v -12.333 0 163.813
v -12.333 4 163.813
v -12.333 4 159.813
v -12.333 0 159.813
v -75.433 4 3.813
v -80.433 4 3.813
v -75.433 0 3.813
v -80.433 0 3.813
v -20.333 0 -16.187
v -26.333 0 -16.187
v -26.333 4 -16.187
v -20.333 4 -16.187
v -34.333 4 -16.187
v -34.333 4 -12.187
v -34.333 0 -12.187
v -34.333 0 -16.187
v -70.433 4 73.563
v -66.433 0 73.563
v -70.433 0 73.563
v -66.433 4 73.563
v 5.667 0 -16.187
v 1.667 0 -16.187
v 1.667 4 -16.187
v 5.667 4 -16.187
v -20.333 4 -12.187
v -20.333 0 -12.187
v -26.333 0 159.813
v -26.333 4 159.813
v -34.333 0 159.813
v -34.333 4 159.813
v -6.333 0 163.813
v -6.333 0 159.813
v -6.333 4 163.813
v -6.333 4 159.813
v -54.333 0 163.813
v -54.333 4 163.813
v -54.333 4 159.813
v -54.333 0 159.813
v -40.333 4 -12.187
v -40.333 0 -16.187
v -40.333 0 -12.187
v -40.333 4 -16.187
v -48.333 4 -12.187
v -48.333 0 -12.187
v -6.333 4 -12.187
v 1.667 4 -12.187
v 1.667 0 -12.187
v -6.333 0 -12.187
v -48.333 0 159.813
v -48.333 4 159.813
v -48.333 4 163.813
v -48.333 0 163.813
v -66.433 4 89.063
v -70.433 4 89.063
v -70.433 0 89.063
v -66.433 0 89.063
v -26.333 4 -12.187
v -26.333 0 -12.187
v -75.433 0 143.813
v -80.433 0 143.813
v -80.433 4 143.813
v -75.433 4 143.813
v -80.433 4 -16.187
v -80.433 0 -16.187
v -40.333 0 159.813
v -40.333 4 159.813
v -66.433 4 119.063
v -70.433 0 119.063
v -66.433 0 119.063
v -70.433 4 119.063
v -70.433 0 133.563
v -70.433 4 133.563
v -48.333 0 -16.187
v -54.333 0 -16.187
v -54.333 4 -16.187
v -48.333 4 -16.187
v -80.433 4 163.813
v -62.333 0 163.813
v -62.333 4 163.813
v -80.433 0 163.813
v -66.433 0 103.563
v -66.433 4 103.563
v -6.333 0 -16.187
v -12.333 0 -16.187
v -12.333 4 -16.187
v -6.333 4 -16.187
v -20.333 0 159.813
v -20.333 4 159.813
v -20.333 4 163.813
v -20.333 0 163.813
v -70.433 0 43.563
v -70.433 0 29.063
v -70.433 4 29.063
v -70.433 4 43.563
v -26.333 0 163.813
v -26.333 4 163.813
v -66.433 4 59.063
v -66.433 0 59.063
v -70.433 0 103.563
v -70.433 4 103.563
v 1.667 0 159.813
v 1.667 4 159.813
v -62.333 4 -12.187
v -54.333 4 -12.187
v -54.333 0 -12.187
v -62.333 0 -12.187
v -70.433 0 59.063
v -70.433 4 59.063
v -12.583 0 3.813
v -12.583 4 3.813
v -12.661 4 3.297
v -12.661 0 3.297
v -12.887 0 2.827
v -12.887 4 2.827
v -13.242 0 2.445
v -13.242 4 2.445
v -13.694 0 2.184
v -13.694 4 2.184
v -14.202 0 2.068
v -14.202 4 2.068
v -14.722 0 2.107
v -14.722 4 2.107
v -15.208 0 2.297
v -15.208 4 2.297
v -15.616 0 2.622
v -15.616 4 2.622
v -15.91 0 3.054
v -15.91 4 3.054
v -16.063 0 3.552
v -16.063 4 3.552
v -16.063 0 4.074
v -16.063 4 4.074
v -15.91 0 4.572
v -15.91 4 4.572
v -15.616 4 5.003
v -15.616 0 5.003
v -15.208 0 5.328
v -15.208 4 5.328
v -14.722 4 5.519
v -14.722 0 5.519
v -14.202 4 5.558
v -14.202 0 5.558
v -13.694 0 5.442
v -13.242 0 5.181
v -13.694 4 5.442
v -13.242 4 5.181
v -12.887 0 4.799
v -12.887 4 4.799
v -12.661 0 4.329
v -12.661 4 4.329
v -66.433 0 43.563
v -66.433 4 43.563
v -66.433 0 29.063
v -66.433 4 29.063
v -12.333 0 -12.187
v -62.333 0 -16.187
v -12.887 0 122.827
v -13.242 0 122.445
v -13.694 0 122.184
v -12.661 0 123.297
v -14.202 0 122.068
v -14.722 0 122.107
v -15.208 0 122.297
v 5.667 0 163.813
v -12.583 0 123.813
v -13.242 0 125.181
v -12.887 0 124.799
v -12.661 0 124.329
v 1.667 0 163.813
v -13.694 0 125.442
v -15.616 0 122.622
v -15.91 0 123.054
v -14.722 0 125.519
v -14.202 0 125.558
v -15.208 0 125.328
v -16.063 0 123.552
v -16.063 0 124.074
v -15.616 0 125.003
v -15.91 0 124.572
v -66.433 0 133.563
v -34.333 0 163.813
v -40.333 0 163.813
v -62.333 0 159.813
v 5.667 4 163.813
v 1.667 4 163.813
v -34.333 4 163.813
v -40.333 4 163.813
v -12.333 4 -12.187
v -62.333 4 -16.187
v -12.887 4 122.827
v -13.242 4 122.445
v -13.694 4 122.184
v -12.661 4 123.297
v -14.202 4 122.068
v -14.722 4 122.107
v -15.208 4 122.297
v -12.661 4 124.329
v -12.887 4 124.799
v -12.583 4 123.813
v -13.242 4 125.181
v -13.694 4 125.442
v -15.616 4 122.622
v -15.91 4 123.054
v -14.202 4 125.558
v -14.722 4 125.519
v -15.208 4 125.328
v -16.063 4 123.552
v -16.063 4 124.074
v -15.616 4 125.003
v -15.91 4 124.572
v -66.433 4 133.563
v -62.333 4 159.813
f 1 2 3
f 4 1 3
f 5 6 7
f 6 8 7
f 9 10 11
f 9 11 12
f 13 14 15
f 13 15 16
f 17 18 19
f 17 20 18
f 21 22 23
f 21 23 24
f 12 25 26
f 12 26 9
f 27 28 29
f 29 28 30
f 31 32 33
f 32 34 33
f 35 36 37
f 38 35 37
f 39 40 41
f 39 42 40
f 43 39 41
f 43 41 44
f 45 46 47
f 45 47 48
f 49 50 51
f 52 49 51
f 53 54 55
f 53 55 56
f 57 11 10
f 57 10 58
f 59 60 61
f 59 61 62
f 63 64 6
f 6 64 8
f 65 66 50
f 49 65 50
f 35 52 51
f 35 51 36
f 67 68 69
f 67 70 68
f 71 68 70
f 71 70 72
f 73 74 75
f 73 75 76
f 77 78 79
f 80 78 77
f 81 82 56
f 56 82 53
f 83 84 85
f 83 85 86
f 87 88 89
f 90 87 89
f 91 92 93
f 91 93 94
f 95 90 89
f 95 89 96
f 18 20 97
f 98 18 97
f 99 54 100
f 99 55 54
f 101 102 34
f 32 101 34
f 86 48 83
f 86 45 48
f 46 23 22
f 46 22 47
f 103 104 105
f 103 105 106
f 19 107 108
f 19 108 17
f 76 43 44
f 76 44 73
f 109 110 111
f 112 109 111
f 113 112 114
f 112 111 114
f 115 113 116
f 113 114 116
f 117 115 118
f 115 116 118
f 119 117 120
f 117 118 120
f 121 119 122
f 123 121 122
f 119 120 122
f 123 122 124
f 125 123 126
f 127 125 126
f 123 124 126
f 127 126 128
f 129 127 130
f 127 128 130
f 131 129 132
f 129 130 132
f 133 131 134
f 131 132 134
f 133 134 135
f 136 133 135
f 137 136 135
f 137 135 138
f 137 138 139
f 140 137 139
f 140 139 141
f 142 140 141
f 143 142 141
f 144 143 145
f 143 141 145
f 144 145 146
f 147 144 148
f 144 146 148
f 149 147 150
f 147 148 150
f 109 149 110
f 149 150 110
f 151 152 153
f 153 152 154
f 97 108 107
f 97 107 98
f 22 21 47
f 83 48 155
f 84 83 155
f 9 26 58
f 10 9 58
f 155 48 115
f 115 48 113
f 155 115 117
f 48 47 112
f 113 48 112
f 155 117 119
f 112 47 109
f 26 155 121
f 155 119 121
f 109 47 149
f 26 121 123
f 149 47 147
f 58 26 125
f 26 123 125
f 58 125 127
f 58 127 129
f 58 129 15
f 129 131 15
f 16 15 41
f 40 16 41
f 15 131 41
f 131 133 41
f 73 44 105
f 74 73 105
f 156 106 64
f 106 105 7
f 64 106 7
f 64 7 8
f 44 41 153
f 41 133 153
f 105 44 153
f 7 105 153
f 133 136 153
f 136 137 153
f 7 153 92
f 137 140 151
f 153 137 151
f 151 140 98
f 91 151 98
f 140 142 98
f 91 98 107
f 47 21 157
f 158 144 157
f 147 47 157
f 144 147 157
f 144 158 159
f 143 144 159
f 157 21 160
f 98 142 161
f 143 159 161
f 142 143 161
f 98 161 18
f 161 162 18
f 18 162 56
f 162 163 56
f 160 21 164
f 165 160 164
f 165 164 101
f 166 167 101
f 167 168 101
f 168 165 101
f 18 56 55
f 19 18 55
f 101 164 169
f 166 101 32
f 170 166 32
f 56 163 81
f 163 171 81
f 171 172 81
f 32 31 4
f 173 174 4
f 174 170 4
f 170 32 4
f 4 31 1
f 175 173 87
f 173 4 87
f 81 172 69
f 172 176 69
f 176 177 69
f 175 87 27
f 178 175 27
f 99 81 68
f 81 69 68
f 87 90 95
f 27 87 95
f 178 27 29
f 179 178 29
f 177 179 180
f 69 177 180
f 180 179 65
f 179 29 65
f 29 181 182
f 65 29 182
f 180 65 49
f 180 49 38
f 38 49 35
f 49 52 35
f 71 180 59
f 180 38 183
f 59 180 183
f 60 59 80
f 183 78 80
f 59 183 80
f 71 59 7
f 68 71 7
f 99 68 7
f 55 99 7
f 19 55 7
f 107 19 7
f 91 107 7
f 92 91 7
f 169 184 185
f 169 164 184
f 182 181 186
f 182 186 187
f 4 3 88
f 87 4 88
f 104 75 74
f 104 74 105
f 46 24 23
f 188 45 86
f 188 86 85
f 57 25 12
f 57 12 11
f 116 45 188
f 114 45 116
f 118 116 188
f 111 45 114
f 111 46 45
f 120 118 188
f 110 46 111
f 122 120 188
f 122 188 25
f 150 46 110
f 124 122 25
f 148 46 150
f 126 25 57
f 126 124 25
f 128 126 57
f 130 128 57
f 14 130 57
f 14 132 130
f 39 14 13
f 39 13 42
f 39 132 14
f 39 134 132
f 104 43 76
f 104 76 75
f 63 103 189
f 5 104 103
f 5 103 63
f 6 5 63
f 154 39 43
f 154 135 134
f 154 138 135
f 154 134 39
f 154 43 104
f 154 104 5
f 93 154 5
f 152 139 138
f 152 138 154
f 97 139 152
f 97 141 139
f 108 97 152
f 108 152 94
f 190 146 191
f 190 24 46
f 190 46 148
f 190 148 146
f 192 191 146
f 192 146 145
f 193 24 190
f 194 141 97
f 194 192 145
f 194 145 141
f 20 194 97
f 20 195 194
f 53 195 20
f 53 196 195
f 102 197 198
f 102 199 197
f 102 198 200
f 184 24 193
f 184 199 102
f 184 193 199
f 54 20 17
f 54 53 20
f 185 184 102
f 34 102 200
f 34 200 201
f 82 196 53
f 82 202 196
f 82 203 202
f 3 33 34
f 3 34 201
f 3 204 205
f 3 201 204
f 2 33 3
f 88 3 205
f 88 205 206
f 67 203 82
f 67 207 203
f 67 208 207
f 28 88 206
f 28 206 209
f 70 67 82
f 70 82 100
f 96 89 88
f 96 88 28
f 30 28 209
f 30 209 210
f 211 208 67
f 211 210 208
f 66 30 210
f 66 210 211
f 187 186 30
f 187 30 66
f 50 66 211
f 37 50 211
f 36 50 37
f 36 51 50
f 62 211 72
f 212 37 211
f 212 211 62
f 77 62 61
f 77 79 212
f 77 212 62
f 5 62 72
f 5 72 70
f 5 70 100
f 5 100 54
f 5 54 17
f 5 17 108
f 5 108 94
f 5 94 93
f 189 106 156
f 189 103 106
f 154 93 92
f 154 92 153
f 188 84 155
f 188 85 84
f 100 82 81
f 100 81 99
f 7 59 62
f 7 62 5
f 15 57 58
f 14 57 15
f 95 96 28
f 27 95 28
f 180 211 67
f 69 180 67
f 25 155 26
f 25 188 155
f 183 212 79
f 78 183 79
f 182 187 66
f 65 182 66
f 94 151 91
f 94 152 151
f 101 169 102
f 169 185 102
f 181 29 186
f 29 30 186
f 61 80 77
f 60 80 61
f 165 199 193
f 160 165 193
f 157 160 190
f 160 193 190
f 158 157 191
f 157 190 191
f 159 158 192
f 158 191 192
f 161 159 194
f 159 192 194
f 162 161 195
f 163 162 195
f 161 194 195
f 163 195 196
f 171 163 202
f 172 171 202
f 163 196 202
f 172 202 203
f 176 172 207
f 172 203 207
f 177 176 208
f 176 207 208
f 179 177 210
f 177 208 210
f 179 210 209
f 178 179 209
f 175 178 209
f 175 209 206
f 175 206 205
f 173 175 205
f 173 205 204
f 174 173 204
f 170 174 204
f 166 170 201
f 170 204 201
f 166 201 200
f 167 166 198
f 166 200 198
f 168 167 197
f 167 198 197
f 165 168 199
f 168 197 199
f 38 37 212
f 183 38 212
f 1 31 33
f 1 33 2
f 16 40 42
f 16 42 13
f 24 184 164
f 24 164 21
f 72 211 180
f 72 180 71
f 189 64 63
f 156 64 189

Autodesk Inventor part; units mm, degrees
ref_plane "YZ Plane" through (0, 0, 0) normal (1, 0, 0) x (0, 1, 0)
ref_plane "XZ Plane" through (0, 0, 0) normal (0, 1, 0) x (-1, 0, 0)
ref_plane "XY Plane" through (0, 0, 0) normal (0, 0, 1) x (1, 0, 0)
sketch "Sketch1" plane through (0, 0, 0) normal (0, 1, 0) x (-1, 0, 0)
  line L0 (-9.6671, 163.8128) -> (70.4329, 163.8128)
  line L1 (70.4329, 163.8128) -> (70.4329, -16.1872)
  line L2 (70.4329, -16.1872) -> (-9.6671, -16.1872)
  line L3 (-9.6671, -16.1872) -> (-9.6671, 163.8128)
  point P0 (0, 0)
extrude "Extrusion1" add sketch "Sketch1" along normal blind 4
sketch "Sketch2" plane through (0, 4, 0) normal (0, 1, 0) x (1, 0, 0)
  line L0 (-66.4329, -159.8128) -> (-66.4329, -148.8128) projected
  line L1 (-70.4329, -159.8128) -> (-70.4329, -148.8128) projected
  line L2 (-66.4329, -159.8128) -> (-66.4329, -148.8128) projected
  line L3 (-70.4329, -159.8128) -> (-70.4329, -148.8128) projected
  line L4 (-66.4329, -159.8128) -> (-66.4329, -148.8128) projected
  line L5 (-70.4329, -159.8128) -> (-70.4329, -148.8128) projected
  line L6 (-66.4329, -159.8128) -> (-66.4329, -148.8128) projected
  line L7 (-70.4329, -159.8128) -> (-70.4329, -148.8128) projected
  line L8 (-66.4329, -159.8128) -> (-66.4329, -148.8128) projected
  line L9 (-70.4329, -159.8128) -> (-70.4329, -148.8128) projected
  line L10 (-66.4329, -159.8128) -> (-66.4329, -148.8128) projected
  line L11 (-70.4329, -159.8128) -> (-70.4329, -148.8128) projected
  line L12 (-70.4329, -163.8128) -> (9.6671, -163.8128) projected
  line L13 (-30.3829, -163.8128) -> (-30.3829, 16.1872) construction
  line L14 (9.6671, 16.1872) -> (-70.4329, 16.1872) projected
  line L15 (-70.4329, -149.0628) -> (-66.4329, -149.0628)
  line L16 (-66.4329, -159.5628) -> (-70.4329, -159.5628)
  line L17 (-70.4329, 0.9372) -> (-66.4329, 0.9372)
  line L18 (-66.4329, -13.5628) -> (-70.4329, -13.5628)
  line L19 (-66.4329, -43.5628) -> (-70.4329, -43.5628)
  line L20 (-70.4329, -29.0628) -> (-66.4329, -29.0628)
  line L21 (-66.4329, -73.5628) -> (-70.4329, -73.5628)
  line L22 (-70.4329, -59.0628) -> (-66.4329, -59.0628)
  line L23 (-66.4329, -103.5628) -> (-70.4329, -103.5628)
  line L24 (-70.4329, -89.0628) -> (-66.4329, -89.0628)
  line L25 (-66.4329, -133.5628) -> (-70.4329, -133.5628)
  line L26 (-70.4329, -119.0628) -> (-66.4329, -119.0628)
  line L27 (5.6671, -159.8128) -> (5.6671, -148.8128)
  line L28 (9.6671, -159.8128) -> (9.6671, -148.8128)
  line L29 (5.6671, -133.8128) -> (5.6671, -118.8128)
  line L30 (9.6671, -133.8128) -> (9.6671, -118.8128)
  line L31 (5.6671, -103.8128) -> (5.6671, -88.8128)
  line L32 (9.6671, -103.8128) -> (9.6671, -88.8128)
  line L33 (5.6671, -73.8128) -> (5.6671, -58.8128)
  line L34 (9.6671, -73.8128) -> (9.6671, -58.8128)
  line L35 (5.6671, -43.8128) -> (5.6671, -28.8128)
  line L36 (9.6671, -43.8128) -> (9.6671, -28.8128)
  line L37 (5.6671, -13.8128) -> (5.6671, 1.1872)
  line L38 (9.6671, -13.8128) -> (9.6671, 1.1872)
  line L39 (9.6671, -149.0628) -> (5.6671, -149.0628)
  line L40 (5.6671, -159.5628) -> (9.6671, -159.5628)
  line L41 (9.6671, 0.9372) -> (5.6671, 0.9372)
  line L42 (5.6671, -13.5628) -> (9.6671, -13.5628)
  line L43 (5.6671, -43.5628) -> (9.6671, -43.5628)
  line L44 (9.6671, -29.0628) -> (5.6671, -29.0628)
  line L45 (5.6671, -73.5628) -> (9.6671, -73.5628)
  line L46 (9.6671, -59.0628) -> (5.6671, -59.0628)
  line L47 (5.6671, -103.5628) -> (9.6671, -103.5628)
  line L48 (9.6671, -89.0628) -> (5.6671, -89.0628)
  line L49 (5.6671, -133.5628) -> (9.6671, -133.5628)
  line L50 (9.6671, -119.0628) -> (5.6671, -119.0628)
  line L51 (-66.4329, -148.8128) -> (-70.4329, -148.8128) projected
  line L52 (-66.4329, -159.8128) -> (-70.4329, -159.8128) projected
  line L53 (-66.4329, -148.8128) -> (-70.4329, -148.8128) projected
  line L54 (-66.4329, -159.8128) -> (-70.4329, -159.8128) projected
  line L55 (-66.4329, -148.8128) -> (-70.4329, -148.8128) projected
  line L56 (-66.4329, -159.8128) -> (-70.4329, -159.8128) projected
  line L57 (-66.4329, -148.8128) -> (-70.4329, -148.8128) projected
  line L58 (-66.4329, -159.8128) -> (-70.4329, -159.8128) projected
  line L59 (-66.4329, -148.8128) -> (-70.4329, -148.8128) projected
  line L60 (-66.4329, -159.8128) -> (-70.4329, -159.8128) projected
  line L61 (-66.4329, -148.8128) -> (-70.4329, -148.8128) projected
  line L62 (-66.4329, -159.8128) -> (-70.4329, -159.8128) projected
  line L63 (-66.4329, -133.5628) -> (-66.4329, -119.0628)
  line L64 (-66.4329, -103.5628) -> (-66.4329, -89.0628)
  line L65 (-66.4329, -73.5628) -> (-66.4329, -59.0628)
  line L66 (-66.4329, -43.5628) -> (-66.4329, -29.0628)
  line L67 (-66.4329, -13.5628) -> (-66.4329, 0.9372)
  line L68 (-70.4329, 16.1872) -> (-70.4329, -163.8128) projected
  line L69 (9.6671, -163.8128) -> (9.6671, 16.1872) projected
  line L70 (1.6671, 16.1872) -> (1.6671, 12.1872)
  line L71 (1.6671, 12.1872) -> (-6.3329, 12.1872)
  line L72 (-6.3329, 12.1872) -> (-6.3329, 16.1872)
  line L73 (-12.3329, 16.1872) -> (-12.3329, 12.1872)
  line L74 (-12.3329, 12.1872) -> (-20.3329, 12.1872)
  line L75 (-20.3329, 12.1872) -> (-20.3329, 16.1872)
  line L76 (-26.3329, 16.1872) -> (-26.3329, 12.1872)
  line L77 (-26.3329, 12.1872) -> (-34.3329, 12.1872)
  line L78 (-34.3329, 12.1872) -> (-34.3329, 16.1872)
  line L79 (-40.3329, 16.1872) -> (-40.3329, 12.1872)
  line L80 (-40.3329, 12.1872) -> (-48.3329, 12.1872)
  line L81 (-48.3329, 12.1872) -> (-48.3329, 16.1872)
  line L82 (-54.3329, 16.1872) -> (-54.3329, 12.1872)
  line L83 (-54.3329, 12.1872) -> (-62.3329, 12.1872)
  line L84 (-62.3329, 12.1872) -> (-62.3329, 16.1872)
  line L85 (-12.3329, -73.8128) -> (-48.4329, -73.8128) construction
  line L86 (1.6671, -163.8128) -> (1.6671, -159.8128)
  line L87 (1.6671, -159.8128) -> (-6.3329, -159.8128)
  line L88 (-6.3329, -159.8128) -> (-6.3329, -163.8128)
  line L89 (-12.3329, -163.8128) -> (-12.3329, -159.8128)
  line L90 (-12.3329, -159.8128) -> (-20.3329, -159.8128)
  line L91 (-20.3329, -159.8128) -> (-20.3329, -163.8128)
  line L92 (-26.3329, -163.8128) -> (-26.3329, -159.8128)
  line L93 (-26.3329, -159.8128) -> (-34.3329, -159.8128)
  line L94 (-34.3329, -159.8128) -> (-34.3329, -163.8128)
  line L95 (-40.3329, -163.8128) -> (-40.3329, -159.8128)
  line L96 (-40.3329, -159.8128) -> (-48.3329, -159.8128)
  line L97 (-48.3329, -159.8128) -> (-48.3329, -163.8128)
  line L98 (-54.3329, -163.8128) -> (-54.3329, -159.8128)
  line L99 (-54.3329, -159.8128) -> (-62.3329, -159.8128)
  line L100 (-62.3329, -159.8128) -> (-62.3329, -163.8128)
  line L101 (9.6671, 1.1872) -> (5.6671, 1.1872)
  line L102 (9.6671, -13.8128) -> (5.6671, -13.8128)
  line L103 (9.6671, -28.8128) -> (5.6671, -28.8128)
  line L104 (9.6671, -43.8128) -> (5.6671, -43.8128)
  line L105 (9.6671, -58.8128) -> (5.6671, -58.8128)
  line L106 (5.6671, -73.8128) -> (9.6671, -73.8128)
  line L107 (9.6671, -88.8128) -> (5.6671, -88.8128)
  line L108 (9.6671, -103.8128) -> (5.6671, -103.8128)
  line L109 (9.6671, -118.8128) -> (5.6671, -118.8128)
  line L110 (9.6671, -133.8128) -> (5.6671, -133.8128)
  line L111 (9.6671, -148.8128) -> (5.6671, -148.8128)
  line L112 (9.6671, -159.8128) -> (5.6671, -159.8128)
  circle A0 centre (-14.3329, -3.8128) radius 1.75
  circle A1 centre (-14.3329, -123.8128) radius 1.75
  line L113 (5.6671, -163.8128) -> (5.6671, 16.1872)
  point P0 (0, 0)
  point P1 (-30.3829, -73.8128)
  point P2 (5.6671, 1.1872)
  dimension "d6" = 30
  dimension "d13" = 4
  dimension "d14" = 8
  dimension "d15" = 4
  dimension "d16" = 8
  dimension "d19" = 14
  dimension "d24" = 180
  dimension "d30" = 3.5
  dimension "d31" = 40
  dimension "d32" = 20
  dimension "d33" = 24
extrude "Extrusion2" cut sketch "Sketch2" against normal up to surface (4 mm away) contours L16 L1 L15 L0 | L100 L99 L98 L12 | L68 L26 L63 L25 | L97 L96 L95 L12 | L68 L24 L64 L23 | L94 L93 L92 L12 | L68 L22 L65 L21 | L91 L90 L89 L12 | L68 L20 L66 L19 | L88 L87 L86 L12 | L68 L17 L67 L18 | L113 L112 L69 L12 | L27 L40 L28 L112 | L27 L39 L28 L40 | L14 L82 L83 L84 | L27 L111 L28 L39 | L113 L110 L69 L111 | L14 L79 L80 L81 | L29 L49 L30 L110 | L29 L50 L30 L49 | L14 L76 L77 L78 | L29 L109 L30 L50 | L113 L108 L69 L109 | L14 L73 L74 L75 | L31 L47 L32 L108 | L31 L48 L32 L47 | L14 L70 L71 L72 | L31 L107 L32 L48 | L113 L106 L69 L107 | L14 L69 L101 L113 | L33 L45 L34 L106 | L101 L38 L41 L37 | L33 L46 L34 L45 | L41 L38 L42 L37 | L33 L105 L34 L46 | L42 L38 L102 L37 | L113 L104 L69 L105 | L102 L69 L103 L113 | L35 L43 L36 L104 | L103 L36 L44 L35 | L35 L44 L36 L43 | A0 | A1
sketch "Sketch4" plane through (0, 0, 0) normal (0, -1, 0) x (1, 0, 0)
  line L0 (-66.4329, 149.0628) -> (-70.4329, 149.0628) projected
  line L1 (-70.4329, 159.5628) -> (-70.4329, 163.8128) projected
  line L2 (-66.4329, 149.0628) -> (-70.4329, 149.0628)
  line L3 (-70.4329, 143.8128) -> (-70.4329, 159.5628)
  line L4 (-70.4329, 159.5628) -> (-66.4329, 159.5628)
  line L5 (-66.4329, 159.5628) -> (-66.4329, 149.0628)
  line L6 (-70.4329, 163.8128) -> (-80.4329, 163.8128)
  line L7 (-80.4329, 163.8128) -> (-80.4329, 143.8128)
  line L8 (-80.4329, 143.8128) -> (-70.4329, 143.8128)
  line L9 (-70.4329, 143.8128) -> (-70.4329, 163.8128)
  line L10 (-70.4329, -16.1872) -> (-70.4329, -0.9372) projected
  line L11 (-66.4329, 13.5628) -> (-70.4329, 13.5628)
  line L12 (-70.4329, 133.5628) -> (-70.4329, -0.9372)
  line L13 (-70.4329, -0.9372) -> (-66.4329, -0.9372)
  line L14 (-66.4329, -0.9372) -> (-66.4329, 13.5628)
  line L15 (-70.4329, 13.5628) -> (-66.4329, 13.5628) projected
  line L16 (-70.4329, -16.1872) -> (-80.4329, -16.1872)
  line L17 (-80.4329, -16.1872) -> (-80.4329, 3.8128)
  line L18 (-80.4329, 3.8128) -> (-70.4329, 3.8128)
  line L19 (-70.4329, 3.8128) -> (-70.4329, -16.1872)
  line L20 (-75.4329, 143.8128) -> (-75.4329, 3.8128)
  line L21 (-40.3329, 163.8128) -> (-40.3329, 159.8128) projected
  line L22 (-40.3329, 159.8128) -> (-48.3329, 159.8128) projected
  line L23 (-48.3329, 159.8128) -> (-48.3329, 163.8128) projected
  line L24 (-54.3329, 163.8128) -> (-48.3329, 163.8128) projected
  line L25 (-54.3329, 163.8128) -> (-54.3329, 159.8128) projected
  line L26 (-54.3329, 159.8128) -> (-62.3329, 159.8128) projected
  line L27 (-62.3329, 159.8128) -> (-62.3329, 163.8128) projected
  line L28 (-70.4329, 163.8128) -> (-62.3329, 163.8128) projected
  line L29 (-70.4329, 159.5628) -> (-70.4329, 163.8128) projected
  line L30 (-70.4329, 159.5628) -> (-66.4329, 159.5628) projected
  line L31 (-66.4329, 159.5628) -> (-66.4329, 149.0628) projected
  line L32 (-66.4329, 149.0628) -> (-70.4329, 149.0628) projected
  line L33 (-70.4329, 133.5628) -> (-70.4329, 149.0628) projected
  line L34 (-70.4329, 133.5628) -> (-66.4329, 133.5628) projected
  line L35 (-66.4329, 133.5628) -> (-66.4329, 119.0628) projected
  line L36 (-66.4329, 119.0628) -> (-70.4329, 119.0628) projected
  line L37 (-70.4329, 103.5628) -> (-70.4329, 119.0628) projected
  line L38 (-70.4329, 103.5628) -> (-66.4329, 103.5628) projected
  line L39 (-66.4329, 103.5628) -> (-66.4329, 89.0628) projected
  line L40 (-66.4329, 89.0628) -> (-70.4329, 89.0628) projected
  line L41 (-70.4329, 73.5628) -> (-70.4329, 89.0628) projected
  line L42 (-70.4329, 73.5628) -> (-66.4329, 73.5628) projected
  line L43 (-66.4329, 73.5628) -> (-66.4329, 59.0628) projected
  line L44 (-66.4329, 59.0628) -> (-70.4329, 59.0628) projected
  line L45 (-70.4329, 43.5628) -> (-70.4329, 59.0628) projected
  line L46 (-70.4329, 43.5628) -> (-66.4329, 43.5628) projected
  line L47 (-66.4329, 43.5628) -> (-66.4329, 29.0628) projected
  line L48 (-66.4329, 29.0628) -> (-70.4329, 29.0628) projected
  line L49 (-70.4329, 13.5628) -> (-70.4329, 29.0628) projected
  line L50 (-70.4329, 13.5628) -> (-66.4329, 13.5628) projected
  line L51 (-66.4329, 13.5628) -> (-66.4329, -0.9372) projected
  line L52 (-66.4329, -0.9372) -> (-70.4329, -0.9372) projected
  line L53 (-70.4329, -16.1872) -> (-70.4329, -0.9372) projected
  line L54 (-62.3329, -16.1872) -> (-70.4329, -16.1872) projected
  line L55 (-62.3329, -16.1872) -> (-62.3329, -12.1872) projected
  line L56 (-62.3329, -12.1872) -> (-54.3329, -12.1872) projected
  line L57 (-54.3329, -12.1872) -> (-54.3329, -16.1872) projected
  line L58 (-48.3329, -16.1872) -> (-54.3329, -16.1872) projected
  line L59 (-48.3329, -16.1872) -> (-48.3329, -12.1872) projected
  line L60 (-48.3329, -12.1872) -> (-40.3329, -12.1872) projected
  line L61 (-40.3329, -12.1872) -> (-40.3329, -16.1872) projected
  line L62 (-34.3329, -16.1872) -> (-40.3329, -16.1872) projected
  line L63 (-34.3329, -16.1872) -> (-34.3329, -12.1872) projected
  line L64 (-34.3329, -12.1872) -> (-26.3329, -12.1872) projected
  line L65 (-26.3329, -12.1872) -> (-26.3329, -16.1872) projected
  line L66 (-20.3329, -16.1872) -> (-26.3329, -16.1872) projected
  line L67 (-20.3329, -16.1872) -> (-20.3329, -12.1872) projected
  line L68 (-20.3329, -12.1872) -> (-12.3329, -12.1872) projected
  line L69 (-12.3329, -12.1872) -> (-12.3329, -16.1872) projected
  line L70 (-6.3329, -16.1872) -> (-12.3329, -16.1872) projected
  line L71 (-6.3329, -16.1872) -> (-6.3329, -12.1872) projected
  line L72 (-6.3329, -12.1872) -> (1.6671, -12.1872) projected
  line L73 (1.6671, -12.1872) -> (1.6671, -16.1872) projected
  line L74 (5.6671, -16.1872) -> (1.6671, -16.1872) projected
  line L75 (1.6671, 163.8128) -> (5.6671, 163.8128) projected
  line L76 (1.6671, 163.8128) -> (1.6671, 159.8128) projected
  line L77 (1.6671, 159.8128) -> (-6.3329, 159.8128) projected
  line L78 (-6.3329, 159.8128) -> (-6.3329, 163.8128) projected
  line L79 (-12.3329, 163.8128) -> (-6.3329, 163.8128) projected
  line L80 (-12.3329, 163.8128) -> (-12.3329, 159.8128) projected
  line L81 (-12.3329, 159.8128) -> (-20.3329, 159.8128) projected
  line L82 (-20.3329, 159.8128) -> (-20.3329, 163.8128) projected
  line L83 (-26.3329, 163.8128) -> (-20.3329, 163.8128) projected
  line L84 (-26.3329, 163.8128) -> (-26.3329, 159.8128) projected
  line L85 (-26.3329, 159.8128) -> (-34.3329, 159.8128) projected
  line L86 (-34.3329, 159.8128) -> (-34.3329, 163.8128) projected
  line L87 (-40.3329, 163.8128) -> (-34.3329, 163.8128) projected
  line L88 (5.6671, -16.1872) -> (5.6671, 163.8128) projected
  point P0 (0, 0)
  dimension "d25" = 10
  dimension "d26" = 20
  dimension "d29" = 5
extrude "Extrusion3" add sketch "Sketch4" against normal up to surface (4 mm away) contours L0 L3 L4 L5 | L3 L8 L7 L6 L1 | L33 L12 L18 L20 L8 | L18 L12 L10 L16 L17 | L12 L11 L14 L13
properties part number "side"
